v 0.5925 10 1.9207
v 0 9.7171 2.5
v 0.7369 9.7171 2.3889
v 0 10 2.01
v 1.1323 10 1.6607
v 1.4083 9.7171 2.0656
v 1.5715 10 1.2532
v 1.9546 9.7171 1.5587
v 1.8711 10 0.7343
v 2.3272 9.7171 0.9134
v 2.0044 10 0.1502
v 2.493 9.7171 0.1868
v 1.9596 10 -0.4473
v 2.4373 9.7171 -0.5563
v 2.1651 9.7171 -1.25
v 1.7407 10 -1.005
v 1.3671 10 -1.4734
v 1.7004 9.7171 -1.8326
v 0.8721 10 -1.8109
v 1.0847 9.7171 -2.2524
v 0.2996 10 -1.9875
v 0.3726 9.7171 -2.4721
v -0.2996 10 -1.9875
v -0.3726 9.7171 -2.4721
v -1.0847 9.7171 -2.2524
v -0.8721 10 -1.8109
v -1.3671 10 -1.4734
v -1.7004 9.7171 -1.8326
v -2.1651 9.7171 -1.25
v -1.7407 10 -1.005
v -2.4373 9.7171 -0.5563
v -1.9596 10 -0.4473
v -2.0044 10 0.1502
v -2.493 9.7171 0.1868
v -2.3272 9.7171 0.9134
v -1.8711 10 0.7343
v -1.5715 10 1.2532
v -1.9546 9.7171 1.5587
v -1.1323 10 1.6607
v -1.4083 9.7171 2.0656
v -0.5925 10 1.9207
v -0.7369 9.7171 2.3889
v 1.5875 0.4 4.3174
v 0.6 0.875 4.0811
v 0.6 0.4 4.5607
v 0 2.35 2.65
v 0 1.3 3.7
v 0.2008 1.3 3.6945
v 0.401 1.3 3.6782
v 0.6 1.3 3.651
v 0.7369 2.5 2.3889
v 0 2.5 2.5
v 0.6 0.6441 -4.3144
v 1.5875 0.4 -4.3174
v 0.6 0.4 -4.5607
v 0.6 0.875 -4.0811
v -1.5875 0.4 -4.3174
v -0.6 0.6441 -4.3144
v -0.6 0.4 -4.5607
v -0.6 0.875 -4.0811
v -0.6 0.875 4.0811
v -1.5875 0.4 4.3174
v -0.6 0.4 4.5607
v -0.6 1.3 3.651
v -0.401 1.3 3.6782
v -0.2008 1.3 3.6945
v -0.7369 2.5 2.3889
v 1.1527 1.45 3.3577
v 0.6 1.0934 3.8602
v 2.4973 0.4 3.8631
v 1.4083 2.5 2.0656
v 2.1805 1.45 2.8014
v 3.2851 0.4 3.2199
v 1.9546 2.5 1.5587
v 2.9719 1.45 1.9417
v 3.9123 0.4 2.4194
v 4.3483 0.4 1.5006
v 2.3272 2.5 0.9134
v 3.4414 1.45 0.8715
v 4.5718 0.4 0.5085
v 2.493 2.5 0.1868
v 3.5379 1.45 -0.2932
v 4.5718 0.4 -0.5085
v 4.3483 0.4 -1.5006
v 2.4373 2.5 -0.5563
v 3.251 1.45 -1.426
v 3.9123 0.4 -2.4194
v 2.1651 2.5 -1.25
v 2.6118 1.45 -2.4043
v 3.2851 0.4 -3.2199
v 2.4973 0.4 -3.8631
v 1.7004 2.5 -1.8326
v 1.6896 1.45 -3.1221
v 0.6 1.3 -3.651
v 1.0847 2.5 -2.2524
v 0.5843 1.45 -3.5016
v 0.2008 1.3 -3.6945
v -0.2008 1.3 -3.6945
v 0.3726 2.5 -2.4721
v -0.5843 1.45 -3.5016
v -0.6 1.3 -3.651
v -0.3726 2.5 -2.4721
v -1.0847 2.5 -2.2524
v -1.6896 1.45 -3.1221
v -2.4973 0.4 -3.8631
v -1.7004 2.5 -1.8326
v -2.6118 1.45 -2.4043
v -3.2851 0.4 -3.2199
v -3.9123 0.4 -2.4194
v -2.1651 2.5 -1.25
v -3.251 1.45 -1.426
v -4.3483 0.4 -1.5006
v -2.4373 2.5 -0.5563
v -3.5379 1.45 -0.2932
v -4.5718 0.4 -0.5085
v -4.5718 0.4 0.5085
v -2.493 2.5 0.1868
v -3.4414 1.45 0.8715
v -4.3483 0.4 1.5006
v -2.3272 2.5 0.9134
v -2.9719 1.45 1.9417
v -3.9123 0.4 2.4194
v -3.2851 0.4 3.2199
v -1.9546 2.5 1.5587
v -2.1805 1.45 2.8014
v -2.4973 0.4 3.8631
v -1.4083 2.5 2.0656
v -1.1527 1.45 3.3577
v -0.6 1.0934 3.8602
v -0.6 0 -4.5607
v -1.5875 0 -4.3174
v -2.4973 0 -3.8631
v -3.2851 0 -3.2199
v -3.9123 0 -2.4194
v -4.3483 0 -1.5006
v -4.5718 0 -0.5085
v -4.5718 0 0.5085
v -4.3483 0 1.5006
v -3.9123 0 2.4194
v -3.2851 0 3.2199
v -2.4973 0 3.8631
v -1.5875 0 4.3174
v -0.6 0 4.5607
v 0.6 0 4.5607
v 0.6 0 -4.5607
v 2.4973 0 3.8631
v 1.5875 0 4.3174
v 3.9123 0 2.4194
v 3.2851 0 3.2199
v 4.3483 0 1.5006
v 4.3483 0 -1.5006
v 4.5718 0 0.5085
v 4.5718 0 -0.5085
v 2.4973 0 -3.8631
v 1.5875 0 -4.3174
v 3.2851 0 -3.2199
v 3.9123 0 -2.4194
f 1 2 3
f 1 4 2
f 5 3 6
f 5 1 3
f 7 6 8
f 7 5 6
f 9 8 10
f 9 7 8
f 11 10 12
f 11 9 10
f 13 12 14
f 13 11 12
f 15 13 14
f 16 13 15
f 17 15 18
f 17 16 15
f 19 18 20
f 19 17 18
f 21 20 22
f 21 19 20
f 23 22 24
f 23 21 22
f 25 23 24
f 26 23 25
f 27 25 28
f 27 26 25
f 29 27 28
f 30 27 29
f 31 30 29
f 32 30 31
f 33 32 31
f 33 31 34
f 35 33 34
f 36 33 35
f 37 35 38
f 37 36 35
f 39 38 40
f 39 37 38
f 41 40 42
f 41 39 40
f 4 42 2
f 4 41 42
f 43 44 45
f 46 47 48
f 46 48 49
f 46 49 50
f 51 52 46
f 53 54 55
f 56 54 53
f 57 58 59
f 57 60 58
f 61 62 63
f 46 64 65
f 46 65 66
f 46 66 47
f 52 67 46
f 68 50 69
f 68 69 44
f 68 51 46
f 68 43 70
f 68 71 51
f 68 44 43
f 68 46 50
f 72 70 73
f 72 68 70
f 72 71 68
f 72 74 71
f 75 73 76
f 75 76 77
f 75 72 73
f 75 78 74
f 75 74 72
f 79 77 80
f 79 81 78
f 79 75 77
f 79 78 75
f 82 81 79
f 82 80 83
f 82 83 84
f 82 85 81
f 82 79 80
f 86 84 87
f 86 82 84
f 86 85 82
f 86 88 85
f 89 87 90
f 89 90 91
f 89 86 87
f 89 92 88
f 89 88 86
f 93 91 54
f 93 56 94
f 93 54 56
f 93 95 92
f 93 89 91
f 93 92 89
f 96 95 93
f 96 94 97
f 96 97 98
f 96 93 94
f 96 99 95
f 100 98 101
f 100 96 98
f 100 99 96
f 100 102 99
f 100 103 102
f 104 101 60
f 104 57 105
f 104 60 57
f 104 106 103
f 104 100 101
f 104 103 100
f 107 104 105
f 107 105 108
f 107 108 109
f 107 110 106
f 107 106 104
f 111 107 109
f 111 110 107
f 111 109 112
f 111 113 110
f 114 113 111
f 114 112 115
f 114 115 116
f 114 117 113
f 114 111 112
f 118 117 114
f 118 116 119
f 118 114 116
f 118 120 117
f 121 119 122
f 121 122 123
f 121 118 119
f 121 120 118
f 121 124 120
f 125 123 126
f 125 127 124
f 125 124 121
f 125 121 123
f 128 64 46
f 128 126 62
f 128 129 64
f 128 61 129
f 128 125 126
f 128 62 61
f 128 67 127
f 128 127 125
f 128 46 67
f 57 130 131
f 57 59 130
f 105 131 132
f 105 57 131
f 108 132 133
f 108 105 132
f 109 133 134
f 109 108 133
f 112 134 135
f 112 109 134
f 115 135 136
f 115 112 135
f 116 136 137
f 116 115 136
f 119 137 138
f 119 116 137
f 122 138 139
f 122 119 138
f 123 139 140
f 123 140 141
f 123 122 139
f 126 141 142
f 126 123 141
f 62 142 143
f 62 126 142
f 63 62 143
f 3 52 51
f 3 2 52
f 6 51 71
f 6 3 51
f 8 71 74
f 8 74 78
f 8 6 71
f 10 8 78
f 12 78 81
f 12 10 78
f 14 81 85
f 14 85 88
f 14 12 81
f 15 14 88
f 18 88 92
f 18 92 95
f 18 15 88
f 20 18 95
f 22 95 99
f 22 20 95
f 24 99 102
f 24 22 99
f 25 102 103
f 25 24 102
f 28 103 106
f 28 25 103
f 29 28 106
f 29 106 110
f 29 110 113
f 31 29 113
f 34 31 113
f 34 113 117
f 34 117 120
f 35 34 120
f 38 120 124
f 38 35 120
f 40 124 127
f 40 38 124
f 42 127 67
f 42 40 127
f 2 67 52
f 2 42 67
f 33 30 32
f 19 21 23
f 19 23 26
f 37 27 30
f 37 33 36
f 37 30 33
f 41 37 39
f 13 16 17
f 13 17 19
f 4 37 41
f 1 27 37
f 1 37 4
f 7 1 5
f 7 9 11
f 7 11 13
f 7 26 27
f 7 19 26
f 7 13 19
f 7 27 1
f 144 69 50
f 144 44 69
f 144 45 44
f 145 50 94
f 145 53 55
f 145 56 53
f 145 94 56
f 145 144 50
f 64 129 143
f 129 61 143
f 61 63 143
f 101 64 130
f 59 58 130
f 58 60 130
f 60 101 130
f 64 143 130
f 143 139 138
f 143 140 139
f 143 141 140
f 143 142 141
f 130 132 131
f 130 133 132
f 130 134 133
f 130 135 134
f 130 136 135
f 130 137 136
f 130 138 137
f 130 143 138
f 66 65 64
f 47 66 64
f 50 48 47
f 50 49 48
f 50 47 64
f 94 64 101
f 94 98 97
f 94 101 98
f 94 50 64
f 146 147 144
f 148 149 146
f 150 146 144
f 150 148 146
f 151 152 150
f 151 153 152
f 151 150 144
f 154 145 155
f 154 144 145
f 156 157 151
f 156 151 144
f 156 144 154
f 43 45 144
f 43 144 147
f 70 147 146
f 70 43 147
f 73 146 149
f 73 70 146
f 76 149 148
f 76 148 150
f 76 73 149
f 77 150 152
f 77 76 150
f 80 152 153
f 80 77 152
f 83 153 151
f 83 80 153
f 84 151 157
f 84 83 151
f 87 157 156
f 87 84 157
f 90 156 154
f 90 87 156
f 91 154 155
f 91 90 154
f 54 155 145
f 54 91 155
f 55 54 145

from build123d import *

# Parameters (mm, degrees)
SKETCH001_W  = 9.2
SKETCH001_H  = 1.2
POCKET_DEPTH = 1.3


with BuildPart() as part:
    # Sketch → Revolution (revolve)
    with BuildSketch(Plane.YZ):
        Polygon((0, 0), (0, 4.6), (0.4, 4.6), (2.5, 2.5), (9.717098, 2.5), (10, 2.01), (10, 0), align=None)
    revolve(axis=Axis((0, 0, 0), (0, 1, 0)))

    # Sketch001 → Pocket (cut)
    with BuildSketch(Plane(origin=(0, 0, 0), x_dir=(0, 0, -1), z_dir=(0, -1, 0))):
        Rectangle(SKETCH001_W, SKETCH001_H)
    extrude(amount=-POCKET_DEPTH, mode=Mode.SUBTRACT)


solid = part.part
